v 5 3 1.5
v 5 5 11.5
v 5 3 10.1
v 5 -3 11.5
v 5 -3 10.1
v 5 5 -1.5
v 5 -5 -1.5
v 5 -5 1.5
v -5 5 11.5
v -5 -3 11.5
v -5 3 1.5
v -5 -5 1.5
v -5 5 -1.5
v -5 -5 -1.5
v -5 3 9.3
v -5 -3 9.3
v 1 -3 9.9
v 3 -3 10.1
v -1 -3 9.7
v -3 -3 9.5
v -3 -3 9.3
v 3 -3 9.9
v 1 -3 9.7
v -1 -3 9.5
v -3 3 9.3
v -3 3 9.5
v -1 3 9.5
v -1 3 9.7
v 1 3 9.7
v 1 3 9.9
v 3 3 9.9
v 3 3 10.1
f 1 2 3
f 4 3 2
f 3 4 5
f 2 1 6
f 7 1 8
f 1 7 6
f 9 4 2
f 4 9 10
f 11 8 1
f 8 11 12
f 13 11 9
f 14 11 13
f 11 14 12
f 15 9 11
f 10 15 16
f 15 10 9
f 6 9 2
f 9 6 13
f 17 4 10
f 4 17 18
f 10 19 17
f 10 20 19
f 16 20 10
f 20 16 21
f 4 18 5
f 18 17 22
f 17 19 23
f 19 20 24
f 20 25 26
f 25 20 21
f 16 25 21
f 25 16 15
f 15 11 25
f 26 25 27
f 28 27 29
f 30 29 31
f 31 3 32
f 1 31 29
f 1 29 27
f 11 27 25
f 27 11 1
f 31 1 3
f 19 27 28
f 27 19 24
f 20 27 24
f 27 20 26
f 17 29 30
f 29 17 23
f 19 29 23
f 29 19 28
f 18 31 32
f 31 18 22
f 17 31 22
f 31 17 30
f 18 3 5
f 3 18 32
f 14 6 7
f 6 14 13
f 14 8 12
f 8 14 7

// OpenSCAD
//fan width tester


cube([10,10,3],true);

difference(){
    translate([0,1,3/2+10/2]){
        cube([10,8,10],true);
    }

    translate([-10/2+1,1-2,3/2+7.8/2]){
        color("Blue")
        cube([2,8,7.8],true);
    }  
    translate([-10/2+3,1-2,3/2+8/2]){
        color("Grey")
        cube([2,8,8],true);
    }
        
    translate([-10/2+5,1-2,3/2+8.2/2]){
        color("Grey")
        cube([2,8,8.2],true);
    }    
    translate([-10/2+7,1-2,3/2+8.4/2]){
        color("Grey")
        cube([2,8,8.4],true);
    }    
    translate([-10/2+9,1-2,3/2+8.6/2]){
        color("Grey")
        cube([2,8,8.6],true);
    }
}
